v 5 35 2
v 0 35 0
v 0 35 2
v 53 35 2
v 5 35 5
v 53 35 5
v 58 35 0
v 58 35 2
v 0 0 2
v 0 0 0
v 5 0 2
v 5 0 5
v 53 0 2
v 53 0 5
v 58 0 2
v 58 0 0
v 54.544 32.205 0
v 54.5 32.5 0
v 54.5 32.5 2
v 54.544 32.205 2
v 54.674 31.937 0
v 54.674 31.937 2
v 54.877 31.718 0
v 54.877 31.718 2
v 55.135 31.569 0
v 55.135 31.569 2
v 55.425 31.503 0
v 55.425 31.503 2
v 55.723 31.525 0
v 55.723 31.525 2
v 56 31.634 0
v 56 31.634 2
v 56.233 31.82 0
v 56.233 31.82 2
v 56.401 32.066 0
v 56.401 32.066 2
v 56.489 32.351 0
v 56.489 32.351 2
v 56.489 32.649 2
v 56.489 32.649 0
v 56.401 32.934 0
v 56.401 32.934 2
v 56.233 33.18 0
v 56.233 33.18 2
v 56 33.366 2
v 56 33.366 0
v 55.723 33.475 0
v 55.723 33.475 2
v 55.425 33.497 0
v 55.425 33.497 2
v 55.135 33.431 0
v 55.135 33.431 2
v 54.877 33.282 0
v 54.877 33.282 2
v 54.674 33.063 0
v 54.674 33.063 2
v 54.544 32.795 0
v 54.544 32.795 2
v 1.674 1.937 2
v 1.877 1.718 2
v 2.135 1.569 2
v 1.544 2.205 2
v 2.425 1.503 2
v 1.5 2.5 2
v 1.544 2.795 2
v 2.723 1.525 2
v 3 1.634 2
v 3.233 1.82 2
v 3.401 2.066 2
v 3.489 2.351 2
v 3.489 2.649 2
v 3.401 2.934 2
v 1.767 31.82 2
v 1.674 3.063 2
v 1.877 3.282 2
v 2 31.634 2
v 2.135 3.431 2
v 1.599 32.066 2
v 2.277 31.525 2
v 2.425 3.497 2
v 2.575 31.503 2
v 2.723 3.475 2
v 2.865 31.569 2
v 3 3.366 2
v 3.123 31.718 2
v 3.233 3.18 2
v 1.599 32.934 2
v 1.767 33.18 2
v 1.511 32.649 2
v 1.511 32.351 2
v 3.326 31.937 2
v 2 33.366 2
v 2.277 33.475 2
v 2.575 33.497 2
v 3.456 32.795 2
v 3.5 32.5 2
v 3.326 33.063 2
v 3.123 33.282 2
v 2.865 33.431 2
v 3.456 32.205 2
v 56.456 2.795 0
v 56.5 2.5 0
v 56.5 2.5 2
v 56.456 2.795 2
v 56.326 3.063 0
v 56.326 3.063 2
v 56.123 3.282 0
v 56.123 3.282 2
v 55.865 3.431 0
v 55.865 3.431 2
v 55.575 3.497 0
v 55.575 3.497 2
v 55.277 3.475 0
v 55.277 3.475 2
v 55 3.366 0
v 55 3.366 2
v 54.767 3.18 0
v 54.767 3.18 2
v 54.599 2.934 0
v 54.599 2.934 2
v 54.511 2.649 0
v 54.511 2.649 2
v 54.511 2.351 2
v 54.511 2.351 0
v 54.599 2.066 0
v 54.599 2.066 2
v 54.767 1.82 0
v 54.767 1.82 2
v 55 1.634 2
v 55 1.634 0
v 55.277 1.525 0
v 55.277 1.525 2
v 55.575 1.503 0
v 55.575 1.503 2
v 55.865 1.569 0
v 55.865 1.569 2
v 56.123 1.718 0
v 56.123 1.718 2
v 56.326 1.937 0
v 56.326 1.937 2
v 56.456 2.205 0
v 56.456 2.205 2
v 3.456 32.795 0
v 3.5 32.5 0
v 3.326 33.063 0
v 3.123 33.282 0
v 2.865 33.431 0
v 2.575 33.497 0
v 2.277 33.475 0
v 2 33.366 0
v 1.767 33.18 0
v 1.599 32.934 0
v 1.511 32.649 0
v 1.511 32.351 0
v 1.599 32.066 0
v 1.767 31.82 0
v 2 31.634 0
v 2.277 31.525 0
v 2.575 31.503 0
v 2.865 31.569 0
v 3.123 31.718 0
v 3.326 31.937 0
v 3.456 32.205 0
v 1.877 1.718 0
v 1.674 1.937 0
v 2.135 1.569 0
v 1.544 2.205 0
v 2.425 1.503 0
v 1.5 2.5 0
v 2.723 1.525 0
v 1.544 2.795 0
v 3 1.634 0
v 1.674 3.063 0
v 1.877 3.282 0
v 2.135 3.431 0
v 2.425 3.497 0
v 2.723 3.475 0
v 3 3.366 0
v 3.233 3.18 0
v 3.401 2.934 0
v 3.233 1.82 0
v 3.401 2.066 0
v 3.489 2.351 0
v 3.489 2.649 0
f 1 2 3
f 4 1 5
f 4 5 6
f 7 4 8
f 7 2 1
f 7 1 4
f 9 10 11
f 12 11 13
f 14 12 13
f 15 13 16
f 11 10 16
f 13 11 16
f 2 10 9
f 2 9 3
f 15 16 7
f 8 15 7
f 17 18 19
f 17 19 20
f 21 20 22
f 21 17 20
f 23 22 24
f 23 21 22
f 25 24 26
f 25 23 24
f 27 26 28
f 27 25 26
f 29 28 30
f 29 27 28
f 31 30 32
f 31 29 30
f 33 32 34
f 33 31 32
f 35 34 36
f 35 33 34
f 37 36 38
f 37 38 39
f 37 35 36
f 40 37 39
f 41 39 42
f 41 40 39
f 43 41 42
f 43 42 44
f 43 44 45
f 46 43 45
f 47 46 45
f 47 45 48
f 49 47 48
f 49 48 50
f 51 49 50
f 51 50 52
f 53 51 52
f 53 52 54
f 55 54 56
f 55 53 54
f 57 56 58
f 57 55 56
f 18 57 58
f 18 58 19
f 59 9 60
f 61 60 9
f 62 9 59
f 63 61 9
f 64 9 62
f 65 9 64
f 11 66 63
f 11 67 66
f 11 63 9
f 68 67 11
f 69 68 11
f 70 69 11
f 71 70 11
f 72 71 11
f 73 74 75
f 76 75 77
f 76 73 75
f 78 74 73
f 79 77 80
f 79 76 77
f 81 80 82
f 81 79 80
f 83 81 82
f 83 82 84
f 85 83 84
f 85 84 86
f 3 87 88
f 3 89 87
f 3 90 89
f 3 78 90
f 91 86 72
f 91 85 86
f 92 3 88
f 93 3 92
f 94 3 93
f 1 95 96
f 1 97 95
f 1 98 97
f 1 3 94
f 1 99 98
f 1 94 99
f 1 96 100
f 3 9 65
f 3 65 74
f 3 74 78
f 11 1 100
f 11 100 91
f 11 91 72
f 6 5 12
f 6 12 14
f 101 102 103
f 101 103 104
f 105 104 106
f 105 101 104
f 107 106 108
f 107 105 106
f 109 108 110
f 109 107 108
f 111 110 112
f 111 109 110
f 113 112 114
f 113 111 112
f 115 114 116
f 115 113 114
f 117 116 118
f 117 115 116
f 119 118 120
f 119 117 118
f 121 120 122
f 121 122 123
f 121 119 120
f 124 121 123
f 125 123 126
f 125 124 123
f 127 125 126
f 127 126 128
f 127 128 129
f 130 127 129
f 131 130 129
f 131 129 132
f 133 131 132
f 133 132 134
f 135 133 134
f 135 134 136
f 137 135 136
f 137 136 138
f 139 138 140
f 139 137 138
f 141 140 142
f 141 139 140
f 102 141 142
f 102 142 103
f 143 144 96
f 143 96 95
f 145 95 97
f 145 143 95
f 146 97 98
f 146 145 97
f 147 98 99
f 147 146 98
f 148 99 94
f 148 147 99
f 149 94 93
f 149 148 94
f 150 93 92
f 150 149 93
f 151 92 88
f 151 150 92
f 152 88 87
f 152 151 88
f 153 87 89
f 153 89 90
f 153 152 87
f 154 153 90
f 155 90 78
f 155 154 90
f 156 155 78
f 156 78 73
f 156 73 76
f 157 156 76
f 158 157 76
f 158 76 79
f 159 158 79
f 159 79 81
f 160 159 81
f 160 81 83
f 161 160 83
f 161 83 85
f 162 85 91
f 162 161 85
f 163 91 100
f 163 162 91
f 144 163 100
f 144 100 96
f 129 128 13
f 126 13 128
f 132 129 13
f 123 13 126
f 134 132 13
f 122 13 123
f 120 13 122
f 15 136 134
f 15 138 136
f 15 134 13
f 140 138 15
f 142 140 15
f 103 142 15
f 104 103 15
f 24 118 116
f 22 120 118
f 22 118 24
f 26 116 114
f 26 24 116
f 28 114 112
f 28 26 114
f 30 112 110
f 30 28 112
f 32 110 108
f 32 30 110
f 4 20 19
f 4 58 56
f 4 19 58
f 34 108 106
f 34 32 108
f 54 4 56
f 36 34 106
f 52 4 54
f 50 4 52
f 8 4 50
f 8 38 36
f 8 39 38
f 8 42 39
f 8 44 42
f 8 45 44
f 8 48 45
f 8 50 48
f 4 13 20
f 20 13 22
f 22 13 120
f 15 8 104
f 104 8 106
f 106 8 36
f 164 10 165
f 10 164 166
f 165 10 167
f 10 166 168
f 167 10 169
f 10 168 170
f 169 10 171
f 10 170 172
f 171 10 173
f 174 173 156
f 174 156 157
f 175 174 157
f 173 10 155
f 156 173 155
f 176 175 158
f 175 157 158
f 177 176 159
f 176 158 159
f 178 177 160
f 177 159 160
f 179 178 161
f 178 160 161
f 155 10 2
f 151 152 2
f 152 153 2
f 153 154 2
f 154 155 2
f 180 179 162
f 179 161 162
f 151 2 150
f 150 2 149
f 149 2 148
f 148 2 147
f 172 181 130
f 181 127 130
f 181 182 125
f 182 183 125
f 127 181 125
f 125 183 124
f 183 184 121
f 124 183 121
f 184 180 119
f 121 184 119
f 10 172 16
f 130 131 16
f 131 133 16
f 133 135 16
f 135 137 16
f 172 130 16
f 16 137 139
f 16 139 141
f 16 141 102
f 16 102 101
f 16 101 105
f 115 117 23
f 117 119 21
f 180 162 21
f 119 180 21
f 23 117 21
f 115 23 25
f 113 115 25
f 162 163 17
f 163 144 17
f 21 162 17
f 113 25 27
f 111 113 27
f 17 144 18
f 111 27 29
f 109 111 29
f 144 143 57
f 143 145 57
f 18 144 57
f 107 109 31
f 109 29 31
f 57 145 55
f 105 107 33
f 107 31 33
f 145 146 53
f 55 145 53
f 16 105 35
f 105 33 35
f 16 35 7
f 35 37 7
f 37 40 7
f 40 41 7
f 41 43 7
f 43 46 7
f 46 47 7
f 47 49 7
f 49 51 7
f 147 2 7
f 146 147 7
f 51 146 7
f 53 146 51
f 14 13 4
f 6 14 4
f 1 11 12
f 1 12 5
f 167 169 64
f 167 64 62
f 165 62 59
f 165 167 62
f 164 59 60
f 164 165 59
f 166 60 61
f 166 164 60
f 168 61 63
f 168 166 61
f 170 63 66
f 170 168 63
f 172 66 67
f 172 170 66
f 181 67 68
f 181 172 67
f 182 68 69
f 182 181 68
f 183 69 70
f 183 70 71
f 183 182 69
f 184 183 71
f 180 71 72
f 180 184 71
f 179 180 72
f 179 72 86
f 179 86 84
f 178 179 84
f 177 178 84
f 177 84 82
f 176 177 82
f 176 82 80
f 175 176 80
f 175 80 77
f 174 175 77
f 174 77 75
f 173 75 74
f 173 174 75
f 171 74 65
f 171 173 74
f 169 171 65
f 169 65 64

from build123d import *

# Parameters (mm, degrees)
SKETCH1_W           = 58
SKETCH1_H           = 35
SKETCH1_R           = 1
BOSS_EXTRUDE1_DEPTH = 2
SKETCH2_W           = 48
SKETCH2_H           = 35
BOSS_EXTRUDE2_DEPTH = 3


with BuildPart() as part:
    # Sketch1 → Boss-Extrude1 (new body)
    with BuildSketch(Plane.XY):
        with Locations((29, 17.5)):
            Rectangle(SKETCH1_W, SKETCH1_H)
        with Locations((2.5, 32.5)):
            Circle(SKETCH1_R, mode=Mode.SUBTRACT)
        with Locations(Location((55.5, 32.5, 0), (0, 0, 180))):
            Circle(SKETCH1_R, mode=Mode.SUBTRACT)
        with Locations(Location((2.5, 2.5, 0), (0, 0, 180))):
            Circle(SKETCH1_R, mode=Mode.SUBTRACT)
        with Locations((55.5, 2.5)):
            Circle(SKETCH1_R, mode=Mode.SUBTRACT)
    extrude(amount=BOSS_EXTRUDE1_DEPTH)

    # Sketch2 → Boss-Extrude2 (add)
    with BuildSketch(Plane.XY.offset(2)):
        with Locations((29, 17.5)):
            Rectangle(SKETCH2_W, SKETCH2_H)
    extrude(amount=BOSS_EXTRUDE2_DEPTH)


solid = part.part
